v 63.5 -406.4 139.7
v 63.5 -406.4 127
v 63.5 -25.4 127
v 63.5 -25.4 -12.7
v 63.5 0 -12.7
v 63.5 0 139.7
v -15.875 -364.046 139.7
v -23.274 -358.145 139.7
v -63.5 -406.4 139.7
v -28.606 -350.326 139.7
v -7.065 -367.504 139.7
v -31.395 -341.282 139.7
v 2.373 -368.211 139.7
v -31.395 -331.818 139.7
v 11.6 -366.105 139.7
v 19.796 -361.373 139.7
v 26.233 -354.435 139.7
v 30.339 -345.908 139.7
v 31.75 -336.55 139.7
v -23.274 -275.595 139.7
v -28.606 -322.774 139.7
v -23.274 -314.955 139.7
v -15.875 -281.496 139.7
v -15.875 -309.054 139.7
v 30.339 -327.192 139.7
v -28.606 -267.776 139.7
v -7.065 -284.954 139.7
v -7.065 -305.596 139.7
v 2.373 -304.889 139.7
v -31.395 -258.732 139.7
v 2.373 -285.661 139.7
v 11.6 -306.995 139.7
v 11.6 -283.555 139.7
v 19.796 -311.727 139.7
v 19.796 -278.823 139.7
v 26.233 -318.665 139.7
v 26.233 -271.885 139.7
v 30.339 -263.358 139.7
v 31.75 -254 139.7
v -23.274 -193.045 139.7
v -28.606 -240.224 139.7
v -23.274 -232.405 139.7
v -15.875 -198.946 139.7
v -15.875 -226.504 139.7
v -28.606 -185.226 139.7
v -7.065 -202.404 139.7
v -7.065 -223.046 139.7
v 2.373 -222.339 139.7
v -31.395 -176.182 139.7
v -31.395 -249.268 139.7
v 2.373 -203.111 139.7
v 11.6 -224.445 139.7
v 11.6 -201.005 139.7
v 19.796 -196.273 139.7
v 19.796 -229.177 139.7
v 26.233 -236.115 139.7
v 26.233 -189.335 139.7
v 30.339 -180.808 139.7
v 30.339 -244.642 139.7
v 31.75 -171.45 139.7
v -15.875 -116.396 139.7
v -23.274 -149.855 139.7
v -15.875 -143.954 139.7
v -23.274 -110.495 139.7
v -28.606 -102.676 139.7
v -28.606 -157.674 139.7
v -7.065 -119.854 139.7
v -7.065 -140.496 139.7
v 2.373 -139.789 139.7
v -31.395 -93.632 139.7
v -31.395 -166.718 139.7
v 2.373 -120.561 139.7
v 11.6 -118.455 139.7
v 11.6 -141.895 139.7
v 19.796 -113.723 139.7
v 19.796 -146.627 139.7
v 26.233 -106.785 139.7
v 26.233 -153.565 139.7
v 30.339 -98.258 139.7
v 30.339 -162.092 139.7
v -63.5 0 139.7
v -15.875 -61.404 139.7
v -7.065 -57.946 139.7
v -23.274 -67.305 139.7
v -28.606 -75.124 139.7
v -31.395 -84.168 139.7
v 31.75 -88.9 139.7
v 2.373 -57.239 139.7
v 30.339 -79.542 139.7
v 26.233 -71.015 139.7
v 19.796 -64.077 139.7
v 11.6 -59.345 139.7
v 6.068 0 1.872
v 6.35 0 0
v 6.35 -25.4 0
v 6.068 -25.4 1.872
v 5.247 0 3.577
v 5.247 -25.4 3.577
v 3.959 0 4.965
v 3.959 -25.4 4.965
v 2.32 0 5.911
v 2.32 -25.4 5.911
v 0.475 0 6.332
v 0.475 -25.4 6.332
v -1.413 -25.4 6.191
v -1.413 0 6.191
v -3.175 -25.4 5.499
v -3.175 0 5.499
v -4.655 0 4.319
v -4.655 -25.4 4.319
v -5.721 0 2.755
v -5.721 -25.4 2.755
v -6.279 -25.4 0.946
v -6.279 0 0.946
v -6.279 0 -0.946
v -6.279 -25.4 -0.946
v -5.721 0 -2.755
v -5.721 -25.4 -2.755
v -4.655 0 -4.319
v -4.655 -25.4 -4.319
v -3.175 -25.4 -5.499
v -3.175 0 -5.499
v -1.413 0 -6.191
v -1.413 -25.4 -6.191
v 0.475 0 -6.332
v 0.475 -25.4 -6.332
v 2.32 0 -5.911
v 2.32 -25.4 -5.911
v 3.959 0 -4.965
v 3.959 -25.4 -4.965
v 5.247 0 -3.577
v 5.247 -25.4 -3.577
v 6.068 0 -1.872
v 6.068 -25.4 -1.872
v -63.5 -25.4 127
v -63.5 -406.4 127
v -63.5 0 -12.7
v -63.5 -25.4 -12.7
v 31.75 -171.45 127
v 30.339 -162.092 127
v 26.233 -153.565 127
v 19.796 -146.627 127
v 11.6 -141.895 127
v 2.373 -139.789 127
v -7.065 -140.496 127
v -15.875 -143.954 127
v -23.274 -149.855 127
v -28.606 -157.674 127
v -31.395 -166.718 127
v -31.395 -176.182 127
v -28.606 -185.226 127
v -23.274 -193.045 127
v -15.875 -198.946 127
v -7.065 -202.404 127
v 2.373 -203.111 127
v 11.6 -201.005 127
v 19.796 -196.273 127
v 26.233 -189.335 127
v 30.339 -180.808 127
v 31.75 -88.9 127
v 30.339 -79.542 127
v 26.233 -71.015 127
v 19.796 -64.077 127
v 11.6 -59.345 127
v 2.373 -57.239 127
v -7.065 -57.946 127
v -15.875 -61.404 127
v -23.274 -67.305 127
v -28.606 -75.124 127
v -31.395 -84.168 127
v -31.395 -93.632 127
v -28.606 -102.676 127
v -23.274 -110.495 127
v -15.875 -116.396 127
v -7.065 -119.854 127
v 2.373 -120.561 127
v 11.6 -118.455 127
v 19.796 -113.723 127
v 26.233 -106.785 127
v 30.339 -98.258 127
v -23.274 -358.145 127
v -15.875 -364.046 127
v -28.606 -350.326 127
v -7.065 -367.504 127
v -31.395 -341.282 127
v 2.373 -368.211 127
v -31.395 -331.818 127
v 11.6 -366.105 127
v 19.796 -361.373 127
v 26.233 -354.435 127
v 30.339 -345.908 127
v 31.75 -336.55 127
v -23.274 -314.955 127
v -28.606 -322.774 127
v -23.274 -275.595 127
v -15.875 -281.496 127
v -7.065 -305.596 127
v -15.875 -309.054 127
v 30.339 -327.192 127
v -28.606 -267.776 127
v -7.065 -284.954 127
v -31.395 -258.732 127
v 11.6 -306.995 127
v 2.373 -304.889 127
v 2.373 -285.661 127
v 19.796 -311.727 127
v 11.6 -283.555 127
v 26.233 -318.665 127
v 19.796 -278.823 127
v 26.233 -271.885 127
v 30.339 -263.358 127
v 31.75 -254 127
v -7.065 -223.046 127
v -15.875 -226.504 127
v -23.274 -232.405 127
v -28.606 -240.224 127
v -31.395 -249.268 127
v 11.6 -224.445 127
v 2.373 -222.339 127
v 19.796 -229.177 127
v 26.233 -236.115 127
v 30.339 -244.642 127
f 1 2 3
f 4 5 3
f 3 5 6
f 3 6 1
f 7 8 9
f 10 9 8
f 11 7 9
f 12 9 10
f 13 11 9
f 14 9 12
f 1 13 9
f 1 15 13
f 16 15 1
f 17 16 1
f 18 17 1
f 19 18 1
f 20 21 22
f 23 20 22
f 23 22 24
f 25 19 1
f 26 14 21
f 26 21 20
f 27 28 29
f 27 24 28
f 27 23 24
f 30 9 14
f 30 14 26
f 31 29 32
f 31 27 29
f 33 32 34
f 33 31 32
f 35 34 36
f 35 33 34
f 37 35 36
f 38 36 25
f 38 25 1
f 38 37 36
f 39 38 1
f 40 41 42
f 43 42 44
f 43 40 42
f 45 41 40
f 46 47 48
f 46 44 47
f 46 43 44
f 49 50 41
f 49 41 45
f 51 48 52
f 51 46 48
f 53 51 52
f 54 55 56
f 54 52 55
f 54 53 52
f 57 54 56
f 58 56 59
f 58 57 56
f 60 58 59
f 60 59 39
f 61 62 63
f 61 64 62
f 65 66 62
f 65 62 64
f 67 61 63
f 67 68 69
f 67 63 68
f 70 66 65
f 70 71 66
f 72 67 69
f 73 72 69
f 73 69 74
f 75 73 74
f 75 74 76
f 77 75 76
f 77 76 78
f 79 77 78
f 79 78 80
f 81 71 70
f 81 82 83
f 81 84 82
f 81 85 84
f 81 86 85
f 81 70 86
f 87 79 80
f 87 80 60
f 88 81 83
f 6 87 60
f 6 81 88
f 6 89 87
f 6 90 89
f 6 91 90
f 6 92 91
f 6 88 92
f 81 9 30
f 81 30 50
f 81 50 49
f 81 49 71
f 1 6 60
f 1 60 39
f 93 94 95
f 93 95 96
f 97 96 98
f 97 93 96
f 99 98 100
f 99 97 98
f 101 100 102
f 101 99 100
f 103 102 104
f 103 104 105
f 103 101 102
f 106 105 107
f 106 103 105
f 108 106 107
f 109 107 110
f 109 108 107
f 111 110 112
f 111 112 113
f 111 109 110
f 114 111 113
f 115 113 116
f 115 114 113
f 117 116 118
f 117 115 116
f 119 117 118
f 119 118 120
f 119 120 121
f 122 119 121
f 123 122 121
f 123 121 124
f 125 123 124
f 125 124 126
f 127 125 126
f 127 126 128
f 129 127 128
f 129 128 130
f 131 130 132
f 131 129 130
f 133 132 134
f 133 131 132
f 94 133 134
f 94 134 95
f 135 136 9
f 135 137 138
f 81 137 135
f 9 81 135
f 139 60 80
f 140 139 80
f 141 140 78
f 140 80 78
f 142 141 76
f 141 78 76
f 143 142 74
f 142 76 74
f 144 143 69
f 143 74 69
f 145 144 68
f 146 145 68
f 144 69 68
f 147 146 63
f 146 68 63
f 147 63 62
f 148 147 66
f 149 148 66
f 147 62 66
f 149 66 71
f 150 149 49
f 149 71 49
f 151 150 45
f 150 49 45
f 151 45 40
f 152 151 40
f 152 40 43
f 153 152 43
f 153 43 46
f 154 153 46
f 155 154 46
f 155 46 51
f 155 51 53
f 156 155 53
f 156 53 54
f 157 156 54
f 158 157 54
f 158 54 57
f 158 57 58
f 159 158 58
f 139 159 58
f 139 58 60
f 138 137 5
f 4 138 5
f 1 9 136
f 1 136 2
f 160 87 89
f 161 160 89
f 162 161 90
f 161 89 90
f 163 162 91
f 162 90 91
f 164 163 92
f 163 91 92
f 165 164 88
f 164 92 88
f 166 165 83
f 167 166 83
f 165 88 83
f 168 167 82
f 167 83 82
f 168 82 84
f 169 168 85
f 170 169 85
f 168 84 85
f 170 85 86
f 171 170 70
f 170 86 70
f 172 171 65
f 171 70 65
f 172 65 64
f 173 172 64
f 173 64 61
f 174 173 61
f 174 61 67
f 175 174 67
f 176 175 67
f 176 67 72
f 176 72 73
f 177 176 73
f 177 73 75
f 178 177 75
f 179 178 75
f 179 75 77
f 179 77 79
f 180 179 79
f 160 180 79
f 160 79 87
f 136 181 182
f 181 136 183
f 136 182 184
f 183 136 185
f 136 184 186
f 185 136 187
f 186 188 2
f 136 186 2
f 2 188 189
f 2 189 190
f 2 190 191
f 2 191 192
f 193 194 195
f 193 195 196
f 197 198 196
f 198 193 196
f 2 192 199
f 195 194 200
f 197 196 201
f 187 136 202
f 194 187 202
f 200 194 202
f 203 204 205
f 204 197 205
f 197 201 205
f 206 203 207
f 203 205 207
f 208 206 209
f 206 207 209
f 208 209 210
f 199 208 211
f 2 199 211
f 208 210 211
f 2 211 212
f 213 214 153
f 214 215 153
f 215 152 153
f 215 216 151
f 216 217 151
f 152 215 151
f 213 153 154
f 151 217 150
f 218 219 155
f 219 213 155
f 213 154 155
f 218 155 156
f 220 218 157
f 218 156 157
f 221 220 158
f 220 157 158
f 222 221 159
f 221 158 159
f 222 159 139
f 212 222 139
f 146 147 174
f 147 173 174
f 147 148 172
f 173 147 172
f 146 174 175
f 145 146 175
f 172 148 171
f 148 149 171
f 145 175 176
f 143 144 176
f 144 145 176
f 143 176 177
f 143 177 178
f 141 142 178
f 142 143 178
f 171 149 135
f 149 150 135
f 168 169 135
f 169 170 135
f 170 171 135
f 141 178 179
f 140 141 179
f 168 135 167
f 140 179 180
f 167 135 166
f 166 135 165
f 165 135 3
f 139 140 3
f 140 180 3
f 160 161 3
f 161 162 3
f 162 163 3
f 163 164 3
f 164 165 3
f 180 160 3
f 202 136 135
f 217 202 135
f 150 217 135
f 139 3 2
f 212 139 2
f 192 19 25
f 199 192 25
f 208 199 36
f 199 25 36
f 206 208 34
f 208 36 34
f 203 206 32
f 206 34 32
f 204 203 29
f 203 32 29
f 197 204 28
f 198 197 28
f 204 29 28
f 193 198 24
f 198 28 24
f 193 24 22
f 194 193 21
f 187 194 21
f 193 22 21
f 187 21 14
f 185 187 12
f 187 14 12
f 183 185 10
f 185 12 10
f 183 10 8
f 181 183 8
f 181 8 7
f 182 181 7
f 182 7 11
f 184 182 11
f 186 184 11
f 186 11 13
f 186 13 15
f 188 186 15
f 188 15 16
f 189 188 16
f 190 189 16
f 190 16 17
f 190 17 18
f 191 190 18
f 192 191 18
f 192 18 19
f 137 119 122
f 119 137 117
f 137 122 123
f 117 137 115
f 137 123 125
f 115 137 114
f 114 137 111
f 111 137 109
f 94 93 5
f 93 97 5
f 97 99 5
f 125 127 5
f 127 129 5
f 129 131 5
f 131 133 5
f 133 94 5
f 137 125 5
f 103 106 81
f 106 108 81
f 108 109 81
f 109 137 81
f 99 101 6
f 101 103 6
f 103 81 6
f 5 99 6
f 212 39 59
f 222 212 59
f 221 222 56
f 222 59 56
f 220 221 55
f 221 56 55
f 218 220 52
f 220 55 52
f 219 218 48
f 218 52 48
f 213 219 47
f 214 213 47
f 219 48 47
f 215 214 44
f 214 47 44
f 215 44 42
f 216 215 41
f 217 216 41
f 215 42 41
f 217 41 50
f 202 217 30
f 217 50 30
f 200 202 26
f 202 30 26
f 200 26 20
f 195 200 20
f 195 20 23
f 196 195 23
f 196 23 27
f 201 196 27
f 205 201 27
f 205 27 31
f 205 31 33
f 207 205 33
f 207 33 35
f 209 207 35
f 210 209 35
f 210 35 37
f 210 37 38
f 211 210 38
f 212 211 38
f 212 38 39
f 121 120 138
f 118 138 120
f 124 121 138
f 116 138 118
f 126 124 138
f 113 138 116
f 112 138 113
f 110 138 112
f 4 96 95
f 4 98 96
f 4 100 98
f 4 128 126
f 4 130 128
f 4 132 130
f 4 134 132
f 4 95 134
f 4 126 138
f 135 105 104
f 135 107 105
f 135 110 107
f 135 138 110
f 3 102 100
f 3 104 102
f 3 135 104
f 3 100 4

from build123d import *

# Parameters (mm, degrees)
F0_W     = 127
F0_H     = 152.4
F0_R     = 6.35
F1_DEPTH = 25.4
F2_W     = 127
F2_H     = 12.7
F3_DEPTH = 381
F4_R     = 31.75
F5_DEPTH = 25.4


with BuildPart() as f1:
    # F0 (on Front) → F1 (new body)
    with BuildSketch(Plane.XZ):
        with Locations((0, 63.5)):
            Rectangle(F0_W, F0_H)
        Circle(F0_R, mode=Mode.SUBTRACT)
    extrude(amount=F1_DEPTH)

    # F2 (on face) → F3 (join)
    with BuildSketch(Plane.XZ.offset(25.4)):
        with Locations((0, 133.35)):
            Rectangle(F2_W, F2_H)
    extrude(amount=F3_DEPTH)

    # F4 (on face) → F5 (cut)
    with BuildSketch(Plane.XY.offset(139.7)):
        with Locations((0, -88.9)):
            Circle(F4_R)
        with Locations((0, -171.45)):
            Circle(F4_R)
        with Locations((0, -254)):
            Circle(F4_R)
        with Locations((0, -336.55)):
            Circle(F4_R)
    extrude(amount=-F5_DEPTH, mode=Mode.SUBTRACT)


solid = f1.part
